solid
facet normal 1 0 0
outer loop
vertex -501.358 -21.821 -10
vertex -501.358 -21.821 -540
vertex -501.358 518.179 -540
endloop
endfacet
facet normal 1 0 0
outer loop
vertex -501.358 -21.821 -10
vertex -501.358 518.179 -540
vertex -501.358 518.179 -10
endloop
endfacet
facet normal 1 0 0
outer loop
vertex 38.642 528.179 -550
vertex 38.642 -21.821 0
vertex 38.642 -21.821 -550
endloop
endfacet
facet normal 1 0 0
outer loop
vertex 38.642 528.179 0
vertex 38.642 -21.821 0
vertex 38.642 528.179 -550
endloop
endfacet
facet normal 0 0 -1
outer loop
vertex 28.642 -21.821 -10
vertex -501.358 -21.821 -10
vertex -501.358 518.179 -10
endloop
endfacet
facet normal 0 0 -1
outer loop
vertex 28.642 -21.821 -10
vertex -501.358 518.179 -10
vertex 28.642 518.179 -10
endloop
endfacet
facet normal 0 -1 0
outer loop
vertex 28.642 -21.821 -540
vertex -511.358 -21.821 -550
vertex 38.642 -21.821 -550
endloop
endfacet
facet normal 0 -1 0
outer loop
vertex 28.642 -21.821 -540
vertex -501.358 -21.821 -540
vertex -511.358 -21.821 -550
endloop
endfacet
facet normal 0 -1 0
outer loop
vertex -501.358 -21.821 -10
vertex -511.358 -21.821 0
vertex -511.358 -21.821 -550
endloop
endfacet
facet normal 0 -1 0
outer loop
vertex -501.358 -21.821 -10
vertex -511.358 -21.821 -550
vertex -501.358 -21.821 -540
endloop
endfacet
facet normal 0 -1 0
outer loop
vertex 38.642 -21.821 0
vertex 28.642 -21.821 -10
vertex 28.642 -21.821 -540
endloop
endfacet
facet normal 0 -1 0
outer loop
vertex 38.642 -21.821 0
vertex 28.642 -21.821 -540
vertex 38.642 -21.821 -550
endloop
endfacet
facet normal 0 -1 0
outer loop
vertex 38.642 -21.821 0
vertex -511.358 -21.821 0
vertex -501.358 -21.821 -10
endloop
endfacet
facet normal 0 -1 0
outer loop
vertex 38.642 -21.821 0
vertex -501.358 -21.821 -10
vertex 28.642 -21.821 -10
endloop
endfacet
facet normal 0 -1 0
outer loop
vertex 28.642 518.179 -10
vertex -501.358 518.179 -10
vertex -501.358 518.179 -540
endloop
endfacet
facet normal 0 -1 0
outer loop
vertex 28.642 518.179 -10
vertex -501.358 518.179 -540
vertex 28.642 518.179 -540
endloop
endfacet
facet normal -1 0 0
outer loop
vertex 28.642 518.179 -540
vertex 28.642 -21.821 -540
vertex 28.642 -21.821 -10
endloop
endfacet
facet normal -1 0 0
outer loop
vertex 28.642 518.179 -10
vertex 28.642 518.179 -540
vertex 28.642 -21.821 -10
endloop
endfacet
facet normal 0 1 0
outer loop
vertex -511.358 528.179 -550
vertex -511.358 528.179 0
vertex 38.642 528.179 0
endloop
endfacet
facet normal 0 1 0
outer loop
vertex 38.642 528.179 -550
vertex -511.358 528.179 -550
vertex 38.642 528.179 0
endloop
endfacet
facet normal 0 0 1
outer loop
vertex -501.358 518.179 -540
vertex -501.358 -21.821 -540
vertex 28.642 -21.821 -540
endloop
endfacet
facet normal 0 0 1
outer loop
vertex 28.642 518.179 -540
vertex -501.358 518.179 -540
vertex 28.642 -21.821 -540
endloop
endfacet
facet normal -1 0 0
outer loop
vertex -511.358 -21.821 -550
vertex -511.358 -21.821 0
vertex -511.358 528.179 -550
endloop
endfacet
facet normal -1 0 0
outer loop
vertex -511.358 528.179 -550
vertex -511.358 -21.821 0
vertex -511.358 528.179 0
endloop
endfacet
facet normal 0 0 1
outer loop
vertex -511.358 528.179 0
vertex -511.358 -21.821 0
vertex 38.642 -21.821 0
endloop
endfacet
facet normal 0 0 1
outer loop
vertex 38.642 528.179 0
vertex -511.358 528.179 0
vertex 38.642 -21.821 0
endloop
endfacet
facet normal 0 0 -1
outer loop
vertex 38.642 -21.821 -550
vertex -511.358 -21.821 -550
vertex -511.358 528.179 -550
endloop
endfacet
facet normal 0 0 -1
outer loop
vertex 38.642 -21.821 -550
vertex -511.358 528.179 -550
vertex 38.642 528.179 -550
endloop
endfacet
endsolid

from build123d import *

# Parameters (mm, degrees)
F0_W     = 550
F0_H     = 550
F1_DEPTH = 550
F2_W     = 530
F2_H     = 530
F3_DEPTH = 540


with BuildPart() as f1:
    # F0 (on Top) → F1 (new body)
    with BuildSketch(Plane.XY):
        with Locations((-236.357567, 253.178654)):
            Rectangle(F0_W, F0_H)
    extrude(amount=-F1_DEPTH)

    # F2 (on face) → F3 (cut)
    with BuildSketch(Plane.XZ.offset(21.821346)):
        with Locations((-236.357567, -275)):
            Rectangle(F2_W, F2_H)
    extrude(amount=-F3_DEPTH, mode=Mode.SUBTRACT)


solid = f1.part
